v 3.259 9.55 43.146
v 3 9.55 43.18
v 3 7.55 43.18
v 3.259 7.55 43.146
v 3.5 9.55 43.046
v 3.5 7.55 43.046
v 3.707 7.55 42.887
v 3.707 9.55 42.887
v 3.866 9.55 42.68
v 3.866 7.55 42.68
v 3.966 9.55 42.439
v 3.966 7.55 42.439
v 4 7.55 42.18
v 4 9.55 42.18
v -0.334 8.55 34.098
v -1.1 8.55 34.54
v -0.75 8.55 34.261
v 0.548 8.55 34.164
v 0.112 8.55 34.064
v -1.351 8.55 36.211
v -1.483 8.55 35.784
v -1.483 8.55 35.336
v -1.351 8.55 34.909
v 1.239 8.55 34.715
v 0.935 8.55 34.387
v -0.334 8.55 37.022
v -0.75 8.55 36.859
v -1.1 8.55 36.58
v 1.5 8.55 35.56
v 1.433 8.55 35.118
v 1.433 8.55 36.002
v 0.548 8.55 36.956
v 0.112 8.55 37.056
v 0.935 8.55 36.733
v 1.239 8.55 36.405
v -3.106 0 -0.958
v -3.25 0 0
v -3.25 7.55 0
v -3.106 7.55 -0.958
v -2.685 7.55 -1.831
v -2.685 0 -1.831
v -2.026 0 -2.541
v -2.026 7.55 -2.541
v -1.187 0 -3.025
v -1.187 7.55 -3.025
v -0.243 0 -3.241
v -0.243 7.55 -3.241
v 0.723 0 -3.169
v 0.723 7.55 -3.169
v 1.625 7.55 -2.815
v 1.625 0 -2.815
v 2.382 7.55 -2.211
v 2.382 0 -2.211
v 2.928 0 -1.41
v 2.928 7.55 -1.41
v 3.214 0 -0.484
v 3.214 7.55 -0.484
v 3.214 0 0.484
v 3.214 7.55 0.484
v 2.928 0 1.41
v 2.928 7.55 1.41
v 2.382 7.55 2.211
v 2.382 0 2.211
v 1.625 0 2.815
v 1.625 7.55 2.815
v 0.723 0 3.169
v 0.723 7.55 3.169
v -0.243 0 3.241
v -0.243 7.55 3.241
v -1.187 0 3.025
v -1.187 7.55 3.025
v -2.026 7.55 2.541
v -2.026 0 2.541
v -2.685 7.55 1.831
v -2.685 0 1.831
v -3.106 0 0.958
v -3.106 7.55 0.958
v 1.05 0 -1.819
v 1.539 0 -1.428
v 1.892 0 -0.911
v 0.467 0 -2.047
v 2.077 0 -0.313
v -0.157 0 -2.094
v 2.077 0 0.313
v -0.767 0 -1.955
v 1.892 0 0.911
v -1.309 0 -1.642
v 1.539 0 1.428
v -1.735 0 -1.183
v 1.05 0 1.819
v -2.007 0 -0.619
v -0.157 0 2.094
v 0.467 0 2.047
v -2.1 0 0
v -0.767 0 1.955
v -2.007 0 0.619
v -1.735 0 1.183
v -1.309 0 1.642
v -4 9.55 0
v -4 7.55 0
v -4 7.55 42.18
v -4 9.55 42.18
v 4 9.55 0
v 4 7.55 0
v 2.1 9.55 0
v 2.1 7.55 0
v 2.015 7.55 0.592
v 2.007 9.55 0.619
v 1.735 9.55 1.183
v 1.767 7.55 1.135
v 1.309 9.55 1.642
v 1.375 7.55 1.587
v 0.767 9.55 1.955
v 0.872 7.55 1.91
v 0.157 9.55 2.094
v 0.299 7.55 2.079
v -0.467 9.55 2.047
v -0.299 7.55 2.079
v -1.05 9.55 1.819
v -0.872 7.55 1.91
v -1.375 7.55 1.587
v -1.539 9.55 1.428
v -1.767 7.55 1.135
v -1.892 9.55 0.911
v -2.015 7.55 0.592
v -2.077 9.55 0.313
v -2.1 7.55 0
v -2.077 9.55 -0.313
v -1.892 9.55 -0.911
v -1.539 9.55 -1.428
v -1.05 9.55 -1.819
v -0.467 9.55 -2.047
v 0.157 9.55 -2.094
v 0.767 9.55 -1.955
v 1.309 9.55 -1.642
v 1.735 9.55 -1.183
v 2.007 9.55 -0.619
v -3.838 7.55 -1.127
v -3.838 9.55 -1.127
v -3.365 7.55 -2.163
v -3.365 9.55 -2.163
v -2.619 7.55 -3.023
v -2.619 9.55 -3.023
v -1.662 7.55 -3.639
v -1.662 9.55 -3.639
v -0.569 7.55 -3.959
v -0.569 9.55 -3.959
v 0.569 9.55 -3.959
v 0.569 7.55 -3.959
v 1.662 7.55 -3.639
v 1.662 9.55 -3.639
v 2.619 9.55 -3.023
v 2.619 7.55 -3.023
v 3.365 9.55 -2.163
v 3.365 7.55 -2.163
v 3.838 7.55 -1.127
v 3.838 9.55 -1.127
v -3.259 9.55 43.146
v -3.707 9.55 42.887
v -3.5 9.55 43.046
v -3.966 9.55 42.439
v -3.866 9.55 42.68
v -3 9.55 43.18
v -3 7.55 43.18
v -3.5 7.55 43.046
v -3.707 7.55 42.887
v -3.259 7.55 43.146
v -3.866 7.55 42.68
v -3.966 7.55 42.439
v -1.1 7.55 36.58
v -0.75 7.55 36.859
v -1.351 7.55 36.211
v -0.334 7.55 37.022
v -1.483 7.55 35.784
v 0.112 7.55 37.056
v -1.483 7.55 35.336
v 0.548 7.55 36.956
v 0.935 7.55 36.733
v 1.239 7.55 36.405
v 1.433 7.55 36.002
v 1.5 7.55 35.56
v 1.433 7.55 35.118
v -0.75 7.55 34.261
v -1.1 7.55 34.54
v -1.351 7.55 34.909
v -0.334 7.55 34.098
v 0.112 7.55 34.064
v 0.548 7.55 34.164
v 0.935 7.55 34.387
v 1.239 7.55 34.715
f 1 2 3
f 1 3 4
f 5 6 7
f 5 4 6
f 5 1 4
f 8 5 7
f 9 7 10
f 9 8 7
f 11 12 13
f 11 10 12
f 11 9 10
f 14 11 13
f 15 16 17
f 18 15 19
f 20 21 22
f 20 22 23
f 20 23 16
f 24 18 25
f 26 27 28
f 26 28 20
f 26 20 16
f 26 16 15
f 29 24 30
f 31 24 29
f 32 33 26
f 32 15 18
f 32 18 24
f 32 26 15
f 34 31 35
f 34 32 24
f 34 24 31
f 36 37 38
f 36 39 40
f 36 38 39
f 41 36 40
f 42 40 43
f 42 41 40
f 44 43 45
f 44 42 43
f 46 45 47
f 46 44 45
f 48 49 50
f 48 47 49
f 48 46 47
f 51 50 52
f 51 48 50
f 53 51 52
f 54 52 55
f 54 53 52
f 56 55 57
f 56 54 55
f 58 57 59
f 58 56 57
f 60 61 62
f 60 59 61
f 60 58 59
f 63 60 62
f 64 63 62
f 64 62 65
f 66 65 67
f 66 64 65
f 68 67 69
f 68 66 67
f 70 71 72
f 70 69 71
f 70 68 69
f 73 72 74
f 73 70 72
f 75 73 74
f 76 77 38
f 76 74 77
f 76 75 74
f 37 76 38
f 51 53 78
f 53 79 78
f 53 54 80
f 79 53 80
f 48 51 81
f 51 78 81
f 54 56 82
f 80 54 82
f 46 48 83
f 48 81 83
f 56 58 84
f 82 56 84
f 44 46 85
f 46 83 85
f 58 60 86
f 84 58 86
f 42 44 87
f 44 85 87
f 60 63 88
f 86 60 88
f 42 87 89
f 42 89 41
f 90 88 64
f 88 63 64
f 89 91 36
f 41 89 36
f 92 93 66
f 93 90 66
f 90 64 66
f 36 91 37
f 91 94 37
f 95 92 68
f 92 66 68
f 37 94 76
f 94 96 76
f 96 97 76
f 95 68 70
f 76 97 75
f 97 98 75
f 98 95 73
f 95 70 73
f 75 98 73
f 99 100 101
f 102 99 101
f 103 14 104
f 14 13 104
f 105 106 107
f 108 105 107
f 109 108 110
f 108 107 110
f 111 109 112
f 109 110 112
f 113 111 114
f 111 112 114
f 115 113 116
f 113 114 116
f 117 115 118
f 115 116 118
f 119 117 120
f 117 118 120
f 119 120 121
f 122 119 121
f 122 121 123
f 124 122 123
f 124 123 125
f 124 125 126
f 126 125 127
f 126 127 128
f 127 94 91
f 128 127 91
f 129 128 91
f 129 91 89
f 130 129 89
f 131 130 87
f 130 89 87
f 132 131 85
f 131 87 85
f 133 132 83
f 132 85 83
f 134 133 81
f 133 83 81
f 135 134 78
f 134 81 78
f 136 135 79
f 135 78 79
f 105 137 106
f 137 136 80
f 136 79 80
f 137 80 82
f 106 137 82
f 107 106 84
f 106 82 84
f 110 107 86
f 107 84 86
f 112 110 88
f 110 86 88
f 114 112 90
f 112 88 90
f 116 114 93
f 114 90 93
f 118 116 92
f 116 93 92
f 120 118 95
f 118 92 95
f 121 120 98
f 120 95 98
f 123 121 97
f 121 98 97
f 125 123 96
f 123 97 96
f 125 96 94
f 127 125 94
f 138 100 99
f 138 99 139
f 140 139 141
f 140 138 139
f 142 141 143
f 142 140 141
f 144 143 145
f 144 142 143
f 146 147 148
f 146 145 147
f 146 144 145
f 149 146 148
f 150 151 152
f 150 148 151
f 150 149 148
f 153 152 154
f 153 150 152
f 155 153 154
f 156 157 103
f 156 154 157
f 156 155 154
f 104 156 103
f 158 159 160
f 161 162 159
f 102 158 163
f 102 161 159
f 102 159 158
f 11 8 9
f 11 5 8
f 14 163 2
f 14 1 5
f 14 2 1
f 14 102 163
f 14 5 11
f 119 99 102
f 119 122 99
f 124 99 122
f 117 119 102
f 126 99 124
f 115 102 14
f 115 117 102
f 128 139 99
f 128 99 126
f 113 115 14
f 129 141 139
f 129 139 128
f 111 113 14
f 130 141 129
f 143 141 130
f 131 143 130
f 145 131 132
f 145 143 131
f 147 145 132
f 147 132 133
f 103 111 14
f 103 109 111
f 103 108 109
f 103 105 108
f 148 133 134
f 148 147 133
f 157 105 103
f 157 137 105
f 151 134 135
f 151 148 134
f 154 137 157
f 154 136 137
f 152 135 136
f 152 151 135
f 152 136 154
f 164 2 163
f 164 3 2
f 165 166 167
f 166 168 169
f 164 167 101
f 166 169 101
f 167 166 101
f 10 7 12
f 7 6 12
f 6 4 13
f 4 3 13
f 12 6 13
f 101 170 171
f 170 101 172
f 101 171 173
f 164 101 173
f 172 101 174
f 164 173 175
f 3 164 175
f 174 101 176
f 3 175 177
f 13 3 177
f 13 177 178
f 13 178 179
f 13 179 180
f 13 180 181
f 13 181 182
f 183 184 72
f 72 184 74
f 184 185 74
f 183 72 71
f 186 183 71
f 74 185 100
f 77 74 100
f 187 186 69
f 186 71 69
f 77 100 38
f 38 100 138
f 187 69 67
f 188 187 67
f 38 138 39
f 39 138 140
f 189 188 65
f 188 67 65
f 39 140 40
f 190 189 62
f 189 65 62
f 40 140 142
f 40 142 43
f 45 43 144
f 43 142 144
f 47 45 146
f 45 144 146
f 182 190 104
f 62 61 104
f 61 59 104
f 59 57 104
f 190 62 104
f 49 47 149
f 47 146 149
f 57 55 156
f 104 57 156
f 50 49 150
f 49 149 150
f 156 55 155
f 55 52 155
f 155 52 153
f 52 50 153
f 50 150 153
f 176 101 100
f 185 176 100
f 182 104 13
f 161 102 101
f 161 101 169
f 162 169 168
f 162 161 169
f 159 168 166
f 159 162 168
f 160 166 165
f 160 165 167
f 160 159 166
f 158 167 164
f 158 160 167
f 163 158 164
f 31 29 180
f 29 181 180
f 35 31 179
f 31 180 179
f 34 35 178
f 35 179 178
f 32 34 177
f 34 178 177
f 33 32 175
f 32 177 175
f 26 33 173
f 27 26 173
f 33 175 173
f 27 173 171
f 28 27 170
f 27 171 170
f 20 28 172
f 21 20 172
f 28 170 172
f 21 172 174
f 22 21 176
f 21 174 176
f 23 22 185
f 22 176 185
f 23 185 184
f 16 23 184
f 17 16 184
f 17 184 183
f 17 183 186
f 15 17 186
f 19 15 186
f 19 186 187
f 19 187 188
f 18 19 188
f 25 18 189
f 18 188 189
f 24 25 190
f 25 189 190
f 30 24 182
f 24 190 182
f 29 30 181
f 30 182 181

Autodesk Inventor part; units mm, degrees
ref_plane "YZ Plane" through (0, 0, 0) normal (1, 0, 0) x (0, 1, 0)
ref_plane "XZ Plane" through (0, 0, 0) normal (0, 1, 0) x (-1, 0, 0)
ref_plane "XY Plane" through (0, 0, 0) normal (0, 0, 1) x (1, 0, 0)
sketch "Sketch1" plane through (0, 0, 0) normal (0, 1, 0) x (-1, 0, 0)
  circle A0 centre (0, 0) radius 3.25
  circle A1 centre (0, 0) radius 2.1
  dimension "d0" = 6.5
  dimension "d1" = 4.2
extrude "Extrusion1" add sketch "Sketch1" along normal blind 7.55
sketch "Sketch2" plane through (0, 7.55, 0) normal (0, 1, 0) x (1, 0, 0)
  line L0 (0, 0) -> (0, -43.18) construction
  line L1 (-4, 0) -> (-4, -43.18)
  line L2 (4, -43.18) -> (4, 0)
  arc A0 (4, 0) -> (-4, 0) centre (0, 0) ccw
  line L3 (4, -43.18) -> (-4, -43.18)
  circle A1 centre (0, 0) radius 2.1 projected
  point P0 (0, -21.59)
  dimension "d6" = 4
  dimension "d7" = 43.18
extrude "Extrusion2" add sketch "Sketch2" along normal blind 2
sketch "Sketch3" plane through (0, 7.55, 0) normal (0, -1, 0) x (1, 0, 0)
  circle A0 centre (0, 35.56) radius 1.5
  circle A1 centre (0, 0) radius 3.25 projected
  dimension "d11" = 3
  dimension "d12" = 35.56
extrude "Extrusion3" cut sketch "Sketch3" against normal blind 1 contours A0
fillet "Fillet1" radius 1 2 edges at (-4, 8.55, 43.18) (4, 8.55, 43.18)
properties part number "CC-bottomHand" material "ABS Plastic"
